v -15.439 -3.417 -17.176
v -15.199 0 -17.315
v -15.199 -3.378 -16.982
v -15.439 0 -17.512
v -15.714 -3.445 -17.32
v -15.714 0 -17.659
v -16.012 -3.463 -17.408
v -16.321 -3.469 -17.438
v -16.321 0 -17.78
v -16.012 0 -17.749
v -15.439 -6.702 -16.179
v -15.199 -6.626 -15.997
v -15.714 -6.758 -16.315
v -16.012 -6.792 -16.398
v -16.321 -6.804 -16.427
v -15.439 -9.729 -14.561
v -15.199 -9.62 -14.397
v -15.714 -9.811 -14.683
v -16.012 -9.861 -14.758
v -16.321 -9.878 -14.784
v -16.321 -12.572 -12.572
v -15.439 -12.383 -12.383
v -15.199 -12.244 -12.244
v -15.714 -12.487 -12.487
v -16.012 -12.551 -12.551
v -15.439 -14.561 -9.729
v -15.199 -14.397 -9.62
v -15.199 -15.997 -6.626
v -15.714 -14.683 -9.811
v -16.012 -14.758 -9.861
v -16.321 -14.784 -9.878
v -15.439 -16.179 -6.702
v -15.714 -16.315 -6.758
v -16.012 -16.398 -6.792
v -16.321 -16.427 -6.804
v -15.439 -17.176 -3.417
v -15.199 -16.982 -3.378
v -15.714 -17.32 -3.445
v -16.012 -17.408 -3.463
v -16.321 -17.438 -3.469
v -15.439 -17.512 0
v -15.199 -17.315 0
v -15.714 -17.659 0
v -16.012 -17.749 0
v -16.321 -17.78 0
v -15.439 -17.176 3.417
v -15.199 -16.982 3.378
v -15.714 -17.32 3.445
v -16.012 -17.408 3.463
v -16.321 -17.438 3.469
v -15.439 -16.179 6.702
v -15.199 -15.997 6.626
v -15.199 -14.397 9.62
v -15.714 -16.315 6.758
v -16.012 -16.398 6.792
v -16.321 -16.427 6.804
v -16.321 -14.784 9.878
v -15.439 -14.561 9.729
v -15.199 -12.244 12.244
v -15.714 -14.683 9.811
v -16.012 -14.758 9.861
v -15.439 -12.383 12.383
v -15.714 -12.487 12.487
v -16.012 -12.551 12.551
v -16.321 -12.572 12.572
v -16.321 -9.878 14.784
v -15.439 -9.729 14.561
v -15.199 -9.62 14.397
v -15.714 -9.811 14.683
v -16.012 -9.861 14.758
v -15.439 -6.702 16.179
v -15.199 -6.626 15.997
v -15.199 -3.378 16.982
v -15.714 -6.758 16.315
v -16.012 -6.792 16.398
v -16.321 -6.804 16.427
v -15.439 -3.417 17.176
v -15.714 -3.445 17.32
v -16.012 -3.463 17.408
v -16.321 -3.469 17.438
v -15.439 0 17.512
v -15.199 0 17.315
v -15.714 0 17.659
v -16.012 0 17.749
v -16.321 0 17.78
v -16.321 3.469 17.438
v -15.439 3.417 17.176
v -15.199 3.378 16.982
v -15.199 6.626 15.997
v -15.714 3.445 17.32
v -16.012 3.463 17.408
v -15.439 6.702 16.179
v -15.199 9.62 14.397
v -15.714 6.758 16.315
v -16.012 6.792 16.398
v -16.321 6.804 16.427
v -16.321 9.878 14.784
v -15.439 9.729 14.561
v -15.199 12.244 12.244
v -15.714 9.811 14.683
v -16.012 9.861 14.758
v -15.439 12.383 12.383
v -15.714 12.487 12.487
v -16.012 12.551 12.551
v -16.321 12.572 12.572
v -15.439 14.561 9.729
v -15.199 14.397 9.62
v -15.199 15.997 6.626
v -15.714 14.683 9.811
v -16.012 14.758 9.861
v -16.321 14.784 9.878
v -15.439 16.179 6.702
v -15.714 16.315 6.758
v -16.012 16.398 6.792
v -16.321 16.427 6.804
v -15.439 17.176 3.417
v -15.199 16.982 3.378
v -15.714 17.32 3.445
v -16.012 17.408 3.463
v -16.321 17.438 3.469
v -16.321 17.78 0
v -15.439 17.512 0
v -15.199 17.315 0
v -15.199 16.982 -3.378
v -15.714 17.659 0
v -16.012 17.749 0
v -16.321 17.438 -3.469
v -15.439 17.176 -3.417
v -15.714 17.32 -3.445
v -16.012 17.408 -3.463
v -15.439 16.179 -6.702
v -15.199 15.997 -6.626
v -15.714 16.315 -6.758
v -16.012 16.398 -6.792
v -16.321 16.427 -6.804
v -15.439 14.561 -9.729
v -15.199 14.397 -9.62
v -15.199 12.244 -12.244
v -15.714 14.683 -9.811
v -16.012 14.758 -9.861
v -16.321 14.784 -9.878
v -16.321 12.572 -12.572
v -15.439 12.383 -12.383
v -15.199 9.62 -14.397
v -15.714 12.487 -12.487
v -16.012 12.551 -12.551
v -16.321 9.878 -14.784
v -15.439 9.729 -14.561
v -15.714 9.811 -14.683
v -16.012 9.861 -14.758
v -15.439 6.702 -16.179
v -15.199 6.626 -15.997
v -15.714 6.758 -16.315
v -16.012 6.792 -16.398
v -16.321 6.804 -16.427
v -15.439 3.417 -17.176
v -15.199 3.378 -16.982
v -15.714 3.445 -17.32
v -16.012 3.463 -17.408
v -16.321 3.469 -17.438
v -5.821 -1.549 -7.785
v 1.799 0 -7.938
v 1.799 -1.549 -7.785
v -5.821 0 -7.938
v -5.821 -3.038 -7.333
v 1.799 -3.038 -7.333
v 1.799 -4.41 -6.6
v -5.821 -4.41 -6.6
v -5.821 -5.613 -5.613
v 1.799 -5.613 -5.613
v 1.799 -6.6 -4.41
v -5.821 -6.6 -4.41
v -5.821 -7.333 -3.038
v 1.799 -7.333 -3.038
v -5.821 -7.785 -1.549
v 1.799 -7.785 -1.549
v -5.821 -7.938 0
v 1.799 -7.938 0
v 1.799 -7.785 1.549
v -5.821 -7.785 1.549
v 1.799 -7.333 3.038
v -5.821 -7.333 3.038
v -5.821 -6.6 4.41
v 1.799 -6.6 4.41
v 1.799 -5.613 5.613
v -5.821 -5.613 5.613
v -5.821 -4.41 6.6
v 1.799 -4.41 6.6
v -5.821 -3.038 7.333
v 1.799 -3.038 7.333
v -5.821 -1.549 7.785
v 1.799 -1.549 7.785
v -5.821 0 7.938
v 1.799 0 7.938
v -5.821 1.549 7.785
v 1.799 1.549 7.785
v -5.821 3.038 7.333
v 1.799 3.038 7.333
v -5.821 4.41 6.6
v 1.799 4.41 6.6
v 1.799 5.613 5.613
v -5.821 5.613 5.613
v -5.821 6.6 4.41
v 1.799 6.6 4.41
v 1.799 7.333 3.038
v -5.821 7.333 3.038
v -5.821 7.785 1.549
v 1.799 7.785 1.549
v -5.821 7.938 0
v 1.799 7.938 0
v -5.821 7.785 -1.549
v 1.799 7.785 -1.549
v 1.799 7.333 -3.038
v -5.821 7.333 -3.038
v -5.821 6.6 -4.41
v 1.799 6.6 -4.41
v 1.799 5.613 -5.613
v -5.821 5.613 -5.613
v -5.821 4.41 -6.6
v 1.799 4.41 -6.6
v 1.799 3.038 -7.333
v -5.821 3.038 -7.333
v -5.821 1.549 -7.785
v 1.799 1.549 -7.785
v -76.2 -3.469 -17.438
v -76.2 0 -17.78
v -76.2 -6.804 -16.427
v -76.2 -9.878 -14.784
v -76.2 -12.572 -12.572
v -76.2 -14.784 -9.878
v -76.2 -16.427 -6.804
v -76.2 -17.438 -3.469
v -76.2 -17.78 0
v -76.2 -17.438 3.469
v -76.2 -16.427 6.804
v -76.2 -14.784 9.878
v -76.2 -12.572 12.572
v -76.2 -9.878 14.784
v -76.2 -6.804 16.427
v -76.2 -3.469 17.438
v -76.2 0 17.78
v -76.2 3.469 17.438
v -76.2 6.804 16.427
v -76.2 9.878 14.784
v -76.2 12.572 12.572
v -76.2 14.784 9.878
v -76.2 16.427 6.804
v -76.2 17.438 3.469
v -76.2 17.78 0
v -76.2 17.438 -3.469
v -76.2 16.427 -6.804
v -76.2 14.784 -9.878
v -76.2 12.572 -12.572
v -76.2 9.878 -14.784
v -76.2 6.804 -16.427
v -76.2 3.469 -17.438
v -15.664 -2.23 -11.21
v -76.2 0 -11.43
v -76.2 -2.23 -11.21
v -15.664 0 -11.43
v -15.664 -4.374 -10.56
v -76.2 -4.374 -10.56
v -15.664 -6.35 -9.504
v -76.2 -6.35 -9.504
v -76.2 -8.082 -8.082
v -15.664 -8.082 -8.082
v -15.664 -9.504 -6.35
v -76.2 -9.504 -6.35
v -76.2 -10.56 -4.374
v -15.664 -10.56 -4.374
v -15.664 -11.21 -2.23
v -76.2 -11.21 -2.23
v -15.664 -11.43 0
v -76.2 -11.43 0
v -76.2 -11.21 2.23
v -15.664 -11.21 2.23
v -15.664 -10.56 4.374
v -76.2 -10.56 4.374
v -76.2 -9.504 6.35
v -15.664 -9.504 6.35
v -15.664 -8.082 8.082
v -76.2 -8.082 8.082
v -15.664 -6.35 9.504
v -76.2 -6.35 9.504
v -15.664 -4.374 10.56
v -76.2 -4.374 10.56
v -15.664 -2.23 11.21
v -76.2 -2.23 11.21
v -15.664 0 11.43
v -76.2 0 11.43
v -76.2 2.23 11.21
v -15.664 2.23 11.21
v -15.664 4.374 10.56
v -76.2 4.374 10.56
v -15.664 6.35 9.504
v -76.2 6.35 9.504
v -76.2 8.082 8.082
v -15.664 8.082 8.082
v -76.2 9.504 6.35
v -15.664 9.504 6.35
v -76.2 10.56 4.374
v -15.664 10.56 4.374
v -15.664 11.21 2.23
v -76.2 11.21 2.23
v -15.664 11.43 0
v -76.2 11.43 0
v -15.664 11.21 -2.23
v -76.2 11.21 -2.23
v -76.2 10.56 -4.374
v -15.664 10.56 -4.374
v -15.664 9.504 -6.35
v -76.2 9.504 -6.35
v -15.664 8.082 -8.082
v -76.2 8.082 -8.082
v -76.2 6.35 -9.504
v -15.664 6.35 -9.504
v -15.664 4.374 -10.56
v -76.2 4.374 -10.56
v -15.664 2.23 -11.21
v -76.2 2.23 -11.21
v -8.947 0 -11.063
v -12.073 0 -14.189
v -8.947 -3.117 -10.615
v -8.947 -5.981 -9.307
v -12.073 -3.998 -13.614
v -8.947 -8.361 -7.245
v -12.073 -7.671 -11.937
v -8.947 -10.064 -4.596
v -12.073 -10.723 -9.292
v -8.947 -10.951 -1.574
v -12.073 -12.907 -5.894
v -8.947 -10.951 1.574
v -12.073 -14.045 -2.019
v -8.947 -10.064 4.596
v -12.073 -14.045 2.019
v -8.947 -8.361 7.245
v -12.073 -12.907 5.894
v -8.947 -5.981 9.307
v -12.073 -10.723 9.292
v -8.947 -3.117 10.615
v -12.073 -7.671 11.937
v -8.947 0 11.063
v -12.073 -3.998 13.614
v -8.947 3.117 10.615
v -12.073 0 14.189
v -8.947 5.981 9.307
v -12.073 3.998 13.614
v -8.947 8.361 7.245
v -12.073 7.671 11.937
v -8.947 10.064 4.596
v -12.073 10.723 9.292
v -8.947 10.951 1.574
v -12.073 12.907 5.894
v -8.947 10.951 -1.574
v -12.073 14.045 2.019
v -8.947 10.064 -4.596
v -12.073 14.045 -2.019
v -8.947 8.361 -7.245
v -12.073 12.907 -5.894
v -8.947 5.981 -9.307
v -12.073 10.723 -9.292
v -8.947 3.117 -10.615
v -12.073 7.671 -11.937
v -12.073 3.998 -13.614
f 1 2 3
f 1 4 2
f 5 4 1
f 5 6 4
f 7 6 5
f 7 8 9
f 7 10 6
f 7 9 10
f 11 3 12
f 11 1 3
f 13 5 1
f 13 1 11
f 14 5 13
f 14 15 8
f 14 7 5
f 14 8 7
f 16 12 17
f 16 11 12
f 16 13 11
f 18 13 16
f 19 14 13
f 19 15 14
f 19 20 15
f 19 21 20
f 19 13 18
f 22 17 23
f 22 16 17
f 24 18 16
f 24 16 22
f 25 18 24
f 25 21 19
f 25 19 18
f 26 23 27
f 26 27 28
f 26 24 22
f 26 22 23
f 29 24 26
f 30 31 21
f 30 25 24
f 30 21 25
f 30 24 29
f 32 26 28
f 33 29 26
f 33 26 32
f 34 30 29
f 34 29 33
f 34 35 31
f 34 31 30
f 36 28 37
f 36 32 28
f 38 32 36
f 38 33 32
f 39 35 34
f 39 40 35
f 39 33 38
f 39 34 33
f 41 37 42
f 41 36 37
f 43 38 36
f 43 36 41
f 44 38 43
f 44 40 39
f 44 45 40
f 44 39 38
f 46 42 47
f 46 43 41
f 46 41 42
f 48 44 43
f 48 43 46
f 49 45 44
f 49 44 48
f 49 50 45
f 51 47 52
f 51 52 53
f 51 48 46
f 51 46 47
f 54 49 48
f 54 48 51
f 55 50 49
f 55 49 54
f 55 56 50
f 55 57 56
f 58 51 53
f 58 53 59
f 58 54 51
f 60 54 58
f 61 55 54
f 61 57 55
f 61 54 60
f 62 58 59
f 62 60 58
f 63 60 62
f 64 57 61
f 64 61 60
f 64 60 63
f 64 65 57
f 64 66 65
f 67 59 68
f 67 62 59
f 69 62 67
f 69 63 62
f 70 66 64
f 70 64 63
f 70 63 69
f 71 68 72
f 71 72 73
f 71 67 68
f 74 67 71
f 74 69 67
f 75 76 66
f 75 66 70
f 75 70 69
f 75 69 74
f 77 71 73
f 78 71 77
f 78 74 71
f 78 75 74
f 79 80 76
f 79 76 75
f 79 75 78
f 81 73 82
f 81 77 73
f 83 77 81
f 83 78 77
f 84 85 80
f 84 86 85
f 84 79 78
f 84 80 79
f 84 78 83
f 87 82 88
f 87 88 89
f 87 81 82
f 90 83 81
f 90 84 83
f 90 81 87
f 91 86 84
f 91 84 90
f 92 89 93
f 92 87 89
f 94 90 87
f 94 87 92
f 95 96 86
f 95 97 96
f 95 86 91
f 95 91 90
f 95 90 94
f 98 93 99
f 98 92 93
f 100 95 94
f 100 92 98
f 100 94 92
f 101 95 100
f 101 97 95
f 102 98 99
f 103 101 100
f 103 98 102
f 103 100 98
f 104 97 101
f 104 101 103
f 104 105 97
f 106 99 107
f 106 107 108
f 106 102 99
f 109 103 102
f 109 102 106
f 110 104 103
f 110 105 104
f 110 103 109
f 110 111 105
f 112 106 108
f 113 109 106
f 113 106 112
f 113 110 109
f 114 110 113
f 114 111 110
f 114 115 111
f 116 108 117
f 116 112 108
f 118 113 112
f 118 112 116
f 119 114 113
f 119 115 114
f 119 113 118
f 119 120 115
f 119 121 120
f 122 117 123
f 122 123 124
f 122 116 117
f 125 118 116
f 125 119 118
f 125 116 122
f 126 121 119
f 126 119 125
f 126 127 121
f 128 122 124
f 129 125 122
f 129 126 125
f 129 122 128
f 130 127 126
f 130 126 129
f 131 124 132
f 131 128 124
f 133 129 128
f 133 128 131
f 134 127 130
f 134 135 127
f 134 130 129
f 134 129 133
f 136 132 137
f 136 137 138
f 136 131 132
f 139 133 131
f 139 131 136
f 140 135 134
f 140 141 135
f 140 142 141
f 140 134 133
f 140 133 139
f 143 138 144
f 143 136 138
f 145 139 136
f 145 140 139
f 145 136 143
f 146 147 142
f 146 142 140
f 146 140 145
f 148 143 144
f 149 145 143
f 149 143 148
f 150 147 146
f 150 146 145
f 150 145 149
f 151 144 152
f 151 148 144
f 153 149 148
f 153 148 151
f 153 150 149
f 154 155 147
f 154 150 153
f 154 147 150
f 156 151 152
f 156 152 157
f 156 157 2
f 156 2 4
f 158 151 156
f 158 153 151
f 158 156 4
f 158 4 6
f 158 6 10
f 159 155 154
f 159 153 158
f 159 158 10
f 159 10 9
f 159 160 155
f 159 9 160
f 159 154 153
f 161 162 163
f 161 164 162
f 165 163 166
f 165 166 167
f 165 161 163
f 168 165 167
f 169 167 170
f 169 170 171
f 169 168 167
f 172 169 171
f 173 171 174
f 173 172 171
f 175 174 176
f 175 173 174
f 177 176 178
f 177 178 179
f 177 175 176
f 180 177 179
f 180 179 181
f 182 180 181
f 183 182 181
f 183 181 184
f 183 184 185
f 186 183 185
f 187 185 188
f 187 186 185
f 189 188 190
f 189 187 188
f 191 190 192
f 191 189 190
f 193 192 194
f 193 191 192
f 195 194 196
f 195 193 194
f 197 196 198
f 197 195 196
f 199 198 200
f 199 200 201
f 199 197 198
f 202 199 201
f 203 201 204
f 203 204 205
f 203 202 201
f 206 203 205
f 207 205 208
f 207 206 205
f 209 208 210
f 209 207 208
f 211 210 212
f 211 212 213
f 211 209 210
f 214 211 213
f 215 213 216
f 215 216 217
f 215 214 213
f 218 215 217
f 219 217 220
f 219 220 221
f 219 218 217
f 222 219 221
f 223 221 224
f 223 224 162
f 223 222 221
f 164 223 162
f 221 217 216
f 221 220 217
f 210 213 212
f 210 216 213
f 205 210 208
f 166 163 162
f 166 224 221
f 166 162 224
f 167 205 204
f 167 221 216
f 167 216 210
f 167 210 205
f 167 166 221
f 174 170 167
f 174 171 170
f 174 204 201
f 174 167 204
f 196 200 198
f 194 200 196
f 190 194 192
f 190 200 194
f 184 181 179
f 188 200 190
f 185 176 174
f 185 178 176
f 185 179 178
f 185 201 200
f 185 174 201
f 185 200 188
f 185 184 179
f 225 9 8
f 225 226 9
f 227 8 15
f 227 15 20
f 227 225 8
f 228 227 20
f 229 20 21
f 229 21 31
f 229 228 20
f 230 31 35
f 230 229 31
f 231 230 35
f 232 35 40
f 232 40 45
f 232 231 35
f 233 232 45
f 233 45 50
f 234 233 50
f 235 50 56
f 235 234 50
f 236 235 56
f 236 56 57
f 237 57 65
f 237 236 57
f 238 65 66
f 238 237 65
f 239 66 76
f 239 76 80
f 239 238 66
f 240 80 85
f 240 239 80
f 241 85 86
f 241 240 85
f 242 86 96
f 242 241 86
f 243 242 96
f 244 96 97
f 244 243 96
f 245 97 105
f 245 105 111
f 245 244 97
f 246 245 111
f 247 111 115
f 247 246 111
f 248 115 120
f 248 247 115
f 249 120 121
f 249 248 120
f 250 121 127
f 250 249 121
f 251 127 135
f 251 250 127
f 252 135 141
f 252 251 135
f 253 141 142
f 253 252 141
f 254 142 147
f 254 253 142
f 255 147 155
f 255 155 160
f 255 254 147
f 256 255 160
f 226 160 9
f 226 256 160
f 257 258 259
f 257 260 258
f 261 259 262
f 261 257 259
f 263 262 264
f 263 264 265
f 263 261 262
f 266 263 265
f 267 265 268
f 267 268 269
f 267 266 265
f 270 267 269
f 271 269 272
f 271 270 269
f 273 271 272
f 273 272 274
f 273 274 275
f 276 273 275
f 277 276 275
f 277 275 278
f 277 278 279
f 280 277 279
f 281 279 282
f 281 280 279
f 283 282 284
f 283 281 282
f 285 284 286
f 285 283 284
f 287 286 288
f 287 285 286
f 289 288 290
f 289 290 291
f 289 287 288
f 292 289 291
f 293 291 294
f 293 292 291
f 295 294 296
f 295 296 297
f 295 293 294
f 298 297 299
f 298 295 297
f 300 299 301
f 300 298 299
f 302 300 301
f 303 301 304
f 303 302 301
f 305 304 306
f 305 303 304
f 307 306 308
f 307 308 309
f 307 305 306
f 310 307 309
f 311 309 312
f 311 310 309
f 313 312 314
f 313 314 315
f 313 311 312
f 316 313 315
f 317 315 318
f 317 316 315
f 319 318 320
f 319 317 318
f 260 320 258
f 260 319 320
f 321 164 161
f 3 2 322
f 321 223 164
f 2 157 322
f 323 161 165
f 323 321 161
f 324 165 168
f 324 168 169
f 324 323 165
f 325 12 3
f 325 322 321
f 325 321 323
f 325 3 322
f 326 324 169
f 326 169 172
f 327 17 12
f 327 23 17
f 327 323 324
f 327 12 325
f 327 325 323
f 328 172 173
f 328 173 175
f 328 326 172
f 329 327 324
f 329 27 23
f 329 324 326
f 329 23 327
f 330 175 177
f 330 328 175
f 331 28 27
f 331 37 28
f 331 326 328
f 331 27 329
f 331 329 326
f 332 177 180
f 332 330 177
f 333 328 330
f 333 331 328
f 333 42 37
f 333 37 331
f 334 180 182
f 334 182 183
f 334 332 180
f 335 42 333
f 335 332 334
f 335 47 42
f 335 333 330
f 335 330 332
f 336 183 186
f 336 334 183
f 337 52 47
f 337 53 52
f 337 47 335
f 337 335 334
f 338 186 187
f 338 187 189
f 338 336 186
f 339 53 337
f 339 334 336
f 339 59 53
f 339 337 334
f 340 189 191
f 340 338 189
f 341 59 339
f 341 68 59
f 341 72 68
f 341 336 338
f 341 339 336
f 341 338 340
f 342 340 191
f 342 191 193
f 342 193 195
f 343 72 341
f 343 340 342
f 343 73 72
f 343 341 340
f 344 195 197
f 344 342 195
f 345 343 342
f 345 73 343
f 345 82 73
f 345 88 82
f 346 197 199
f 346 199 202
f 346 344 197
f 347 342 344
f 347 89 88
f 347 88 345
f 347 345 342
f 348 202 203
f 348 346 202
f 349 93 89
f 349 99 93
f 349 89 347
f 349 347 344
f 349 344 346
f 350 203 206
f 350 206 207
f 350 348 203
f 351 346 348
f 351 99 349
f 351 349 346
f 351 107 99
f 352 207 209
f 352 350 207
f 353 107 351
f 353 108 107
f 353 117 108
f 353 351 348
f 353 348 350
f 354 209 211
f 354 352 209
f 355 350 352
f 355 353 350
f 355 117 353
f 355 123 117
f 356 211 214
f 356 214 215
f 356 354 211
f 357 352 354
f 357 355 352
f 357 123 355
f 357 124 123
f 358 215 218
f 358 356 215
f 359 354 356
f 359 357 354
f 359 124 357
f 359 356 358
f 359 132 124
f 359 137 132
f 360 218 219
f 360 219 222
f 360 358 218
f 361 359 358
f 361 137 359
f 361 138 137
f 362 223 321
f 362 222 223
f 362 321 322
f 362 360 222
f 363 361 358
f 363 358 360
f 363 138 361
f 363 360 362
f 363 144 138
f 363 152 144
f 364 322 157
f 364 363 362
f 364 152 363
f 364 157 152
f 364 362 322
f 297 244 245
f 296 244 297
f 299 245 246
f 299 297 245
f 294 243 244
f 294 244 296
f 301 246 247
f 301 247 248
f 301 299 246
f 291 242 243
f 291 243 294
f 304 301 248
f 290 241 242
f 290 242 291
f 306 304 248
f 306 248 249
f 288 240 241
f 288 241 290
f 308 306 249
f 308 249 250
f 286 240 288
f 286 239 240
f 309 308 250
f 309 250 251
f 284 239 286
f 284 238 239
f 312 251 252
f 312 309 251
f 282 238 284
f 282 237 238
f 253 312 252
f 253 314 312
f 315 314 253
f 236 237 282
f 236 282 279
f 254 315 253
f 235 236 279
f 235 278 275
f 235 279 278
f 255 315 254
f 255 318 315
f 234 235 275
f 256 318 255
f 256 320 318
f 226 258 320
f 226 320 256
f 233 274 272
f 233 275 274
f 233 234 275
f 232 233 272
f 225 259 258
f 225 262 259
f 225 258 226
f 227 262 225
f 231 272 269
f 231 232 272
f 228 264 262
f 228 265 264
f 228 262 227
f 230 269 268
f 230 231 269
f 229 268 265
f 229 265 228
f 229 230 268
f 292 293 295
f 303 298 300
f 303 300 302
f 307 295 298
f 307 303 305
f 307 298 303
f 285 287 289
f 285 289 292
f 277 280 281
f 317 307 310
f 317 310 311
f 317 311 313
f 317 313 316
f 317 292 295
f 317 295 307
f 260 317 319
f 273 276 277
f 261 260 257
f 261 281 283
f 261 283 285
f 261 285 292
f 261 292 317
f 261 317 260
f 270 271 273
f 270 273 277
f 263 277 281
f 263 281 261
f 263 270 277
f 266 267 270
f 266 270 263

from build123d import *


with BuildPart() as part:
    # Sketch3 → Revolve1 (revolve)
    with BuildSketch(Plane.XY, mode=Mode.PRIVATE) as revolve1_sk:
        with BuildLine():
            Line((-76.2, 17.78), (-76.2, 11.43))
            Line((-76.2, 11.43), (-15.663873033, 11.43))
            Line((-15.663873033, 11.43), (-15.663873033, 0))
            Line((-15.663873033, 0), (-5.821373033, 0))
            Line((-5.821373033, 0), (1.798626967, 0))
            Line((1.798626967, 0), (1.798626967, 7.9375))
            Line((1.798626967, 7.9375), (-5.821373033, 7.9375))
            Line((-5.821373033, 7.9375), (-15.198905048, 17.315032015))
            ThreePointArc((-15.198905048, 17.315032015), (-15.713927115, 17.659158758), (-16.321437064, 17.78))
            Line((-16.321437064, 17.78), (-76.2, 17.78))
        make_face()
    revolve(revolve1_sk.sketch.rotate(Axis((24.172114646, 0, 0), (-1, 0, 0)), 90), axis=Axis((24.172114646, 0, 0), (-1, 0, 0)))


solid = part.part
